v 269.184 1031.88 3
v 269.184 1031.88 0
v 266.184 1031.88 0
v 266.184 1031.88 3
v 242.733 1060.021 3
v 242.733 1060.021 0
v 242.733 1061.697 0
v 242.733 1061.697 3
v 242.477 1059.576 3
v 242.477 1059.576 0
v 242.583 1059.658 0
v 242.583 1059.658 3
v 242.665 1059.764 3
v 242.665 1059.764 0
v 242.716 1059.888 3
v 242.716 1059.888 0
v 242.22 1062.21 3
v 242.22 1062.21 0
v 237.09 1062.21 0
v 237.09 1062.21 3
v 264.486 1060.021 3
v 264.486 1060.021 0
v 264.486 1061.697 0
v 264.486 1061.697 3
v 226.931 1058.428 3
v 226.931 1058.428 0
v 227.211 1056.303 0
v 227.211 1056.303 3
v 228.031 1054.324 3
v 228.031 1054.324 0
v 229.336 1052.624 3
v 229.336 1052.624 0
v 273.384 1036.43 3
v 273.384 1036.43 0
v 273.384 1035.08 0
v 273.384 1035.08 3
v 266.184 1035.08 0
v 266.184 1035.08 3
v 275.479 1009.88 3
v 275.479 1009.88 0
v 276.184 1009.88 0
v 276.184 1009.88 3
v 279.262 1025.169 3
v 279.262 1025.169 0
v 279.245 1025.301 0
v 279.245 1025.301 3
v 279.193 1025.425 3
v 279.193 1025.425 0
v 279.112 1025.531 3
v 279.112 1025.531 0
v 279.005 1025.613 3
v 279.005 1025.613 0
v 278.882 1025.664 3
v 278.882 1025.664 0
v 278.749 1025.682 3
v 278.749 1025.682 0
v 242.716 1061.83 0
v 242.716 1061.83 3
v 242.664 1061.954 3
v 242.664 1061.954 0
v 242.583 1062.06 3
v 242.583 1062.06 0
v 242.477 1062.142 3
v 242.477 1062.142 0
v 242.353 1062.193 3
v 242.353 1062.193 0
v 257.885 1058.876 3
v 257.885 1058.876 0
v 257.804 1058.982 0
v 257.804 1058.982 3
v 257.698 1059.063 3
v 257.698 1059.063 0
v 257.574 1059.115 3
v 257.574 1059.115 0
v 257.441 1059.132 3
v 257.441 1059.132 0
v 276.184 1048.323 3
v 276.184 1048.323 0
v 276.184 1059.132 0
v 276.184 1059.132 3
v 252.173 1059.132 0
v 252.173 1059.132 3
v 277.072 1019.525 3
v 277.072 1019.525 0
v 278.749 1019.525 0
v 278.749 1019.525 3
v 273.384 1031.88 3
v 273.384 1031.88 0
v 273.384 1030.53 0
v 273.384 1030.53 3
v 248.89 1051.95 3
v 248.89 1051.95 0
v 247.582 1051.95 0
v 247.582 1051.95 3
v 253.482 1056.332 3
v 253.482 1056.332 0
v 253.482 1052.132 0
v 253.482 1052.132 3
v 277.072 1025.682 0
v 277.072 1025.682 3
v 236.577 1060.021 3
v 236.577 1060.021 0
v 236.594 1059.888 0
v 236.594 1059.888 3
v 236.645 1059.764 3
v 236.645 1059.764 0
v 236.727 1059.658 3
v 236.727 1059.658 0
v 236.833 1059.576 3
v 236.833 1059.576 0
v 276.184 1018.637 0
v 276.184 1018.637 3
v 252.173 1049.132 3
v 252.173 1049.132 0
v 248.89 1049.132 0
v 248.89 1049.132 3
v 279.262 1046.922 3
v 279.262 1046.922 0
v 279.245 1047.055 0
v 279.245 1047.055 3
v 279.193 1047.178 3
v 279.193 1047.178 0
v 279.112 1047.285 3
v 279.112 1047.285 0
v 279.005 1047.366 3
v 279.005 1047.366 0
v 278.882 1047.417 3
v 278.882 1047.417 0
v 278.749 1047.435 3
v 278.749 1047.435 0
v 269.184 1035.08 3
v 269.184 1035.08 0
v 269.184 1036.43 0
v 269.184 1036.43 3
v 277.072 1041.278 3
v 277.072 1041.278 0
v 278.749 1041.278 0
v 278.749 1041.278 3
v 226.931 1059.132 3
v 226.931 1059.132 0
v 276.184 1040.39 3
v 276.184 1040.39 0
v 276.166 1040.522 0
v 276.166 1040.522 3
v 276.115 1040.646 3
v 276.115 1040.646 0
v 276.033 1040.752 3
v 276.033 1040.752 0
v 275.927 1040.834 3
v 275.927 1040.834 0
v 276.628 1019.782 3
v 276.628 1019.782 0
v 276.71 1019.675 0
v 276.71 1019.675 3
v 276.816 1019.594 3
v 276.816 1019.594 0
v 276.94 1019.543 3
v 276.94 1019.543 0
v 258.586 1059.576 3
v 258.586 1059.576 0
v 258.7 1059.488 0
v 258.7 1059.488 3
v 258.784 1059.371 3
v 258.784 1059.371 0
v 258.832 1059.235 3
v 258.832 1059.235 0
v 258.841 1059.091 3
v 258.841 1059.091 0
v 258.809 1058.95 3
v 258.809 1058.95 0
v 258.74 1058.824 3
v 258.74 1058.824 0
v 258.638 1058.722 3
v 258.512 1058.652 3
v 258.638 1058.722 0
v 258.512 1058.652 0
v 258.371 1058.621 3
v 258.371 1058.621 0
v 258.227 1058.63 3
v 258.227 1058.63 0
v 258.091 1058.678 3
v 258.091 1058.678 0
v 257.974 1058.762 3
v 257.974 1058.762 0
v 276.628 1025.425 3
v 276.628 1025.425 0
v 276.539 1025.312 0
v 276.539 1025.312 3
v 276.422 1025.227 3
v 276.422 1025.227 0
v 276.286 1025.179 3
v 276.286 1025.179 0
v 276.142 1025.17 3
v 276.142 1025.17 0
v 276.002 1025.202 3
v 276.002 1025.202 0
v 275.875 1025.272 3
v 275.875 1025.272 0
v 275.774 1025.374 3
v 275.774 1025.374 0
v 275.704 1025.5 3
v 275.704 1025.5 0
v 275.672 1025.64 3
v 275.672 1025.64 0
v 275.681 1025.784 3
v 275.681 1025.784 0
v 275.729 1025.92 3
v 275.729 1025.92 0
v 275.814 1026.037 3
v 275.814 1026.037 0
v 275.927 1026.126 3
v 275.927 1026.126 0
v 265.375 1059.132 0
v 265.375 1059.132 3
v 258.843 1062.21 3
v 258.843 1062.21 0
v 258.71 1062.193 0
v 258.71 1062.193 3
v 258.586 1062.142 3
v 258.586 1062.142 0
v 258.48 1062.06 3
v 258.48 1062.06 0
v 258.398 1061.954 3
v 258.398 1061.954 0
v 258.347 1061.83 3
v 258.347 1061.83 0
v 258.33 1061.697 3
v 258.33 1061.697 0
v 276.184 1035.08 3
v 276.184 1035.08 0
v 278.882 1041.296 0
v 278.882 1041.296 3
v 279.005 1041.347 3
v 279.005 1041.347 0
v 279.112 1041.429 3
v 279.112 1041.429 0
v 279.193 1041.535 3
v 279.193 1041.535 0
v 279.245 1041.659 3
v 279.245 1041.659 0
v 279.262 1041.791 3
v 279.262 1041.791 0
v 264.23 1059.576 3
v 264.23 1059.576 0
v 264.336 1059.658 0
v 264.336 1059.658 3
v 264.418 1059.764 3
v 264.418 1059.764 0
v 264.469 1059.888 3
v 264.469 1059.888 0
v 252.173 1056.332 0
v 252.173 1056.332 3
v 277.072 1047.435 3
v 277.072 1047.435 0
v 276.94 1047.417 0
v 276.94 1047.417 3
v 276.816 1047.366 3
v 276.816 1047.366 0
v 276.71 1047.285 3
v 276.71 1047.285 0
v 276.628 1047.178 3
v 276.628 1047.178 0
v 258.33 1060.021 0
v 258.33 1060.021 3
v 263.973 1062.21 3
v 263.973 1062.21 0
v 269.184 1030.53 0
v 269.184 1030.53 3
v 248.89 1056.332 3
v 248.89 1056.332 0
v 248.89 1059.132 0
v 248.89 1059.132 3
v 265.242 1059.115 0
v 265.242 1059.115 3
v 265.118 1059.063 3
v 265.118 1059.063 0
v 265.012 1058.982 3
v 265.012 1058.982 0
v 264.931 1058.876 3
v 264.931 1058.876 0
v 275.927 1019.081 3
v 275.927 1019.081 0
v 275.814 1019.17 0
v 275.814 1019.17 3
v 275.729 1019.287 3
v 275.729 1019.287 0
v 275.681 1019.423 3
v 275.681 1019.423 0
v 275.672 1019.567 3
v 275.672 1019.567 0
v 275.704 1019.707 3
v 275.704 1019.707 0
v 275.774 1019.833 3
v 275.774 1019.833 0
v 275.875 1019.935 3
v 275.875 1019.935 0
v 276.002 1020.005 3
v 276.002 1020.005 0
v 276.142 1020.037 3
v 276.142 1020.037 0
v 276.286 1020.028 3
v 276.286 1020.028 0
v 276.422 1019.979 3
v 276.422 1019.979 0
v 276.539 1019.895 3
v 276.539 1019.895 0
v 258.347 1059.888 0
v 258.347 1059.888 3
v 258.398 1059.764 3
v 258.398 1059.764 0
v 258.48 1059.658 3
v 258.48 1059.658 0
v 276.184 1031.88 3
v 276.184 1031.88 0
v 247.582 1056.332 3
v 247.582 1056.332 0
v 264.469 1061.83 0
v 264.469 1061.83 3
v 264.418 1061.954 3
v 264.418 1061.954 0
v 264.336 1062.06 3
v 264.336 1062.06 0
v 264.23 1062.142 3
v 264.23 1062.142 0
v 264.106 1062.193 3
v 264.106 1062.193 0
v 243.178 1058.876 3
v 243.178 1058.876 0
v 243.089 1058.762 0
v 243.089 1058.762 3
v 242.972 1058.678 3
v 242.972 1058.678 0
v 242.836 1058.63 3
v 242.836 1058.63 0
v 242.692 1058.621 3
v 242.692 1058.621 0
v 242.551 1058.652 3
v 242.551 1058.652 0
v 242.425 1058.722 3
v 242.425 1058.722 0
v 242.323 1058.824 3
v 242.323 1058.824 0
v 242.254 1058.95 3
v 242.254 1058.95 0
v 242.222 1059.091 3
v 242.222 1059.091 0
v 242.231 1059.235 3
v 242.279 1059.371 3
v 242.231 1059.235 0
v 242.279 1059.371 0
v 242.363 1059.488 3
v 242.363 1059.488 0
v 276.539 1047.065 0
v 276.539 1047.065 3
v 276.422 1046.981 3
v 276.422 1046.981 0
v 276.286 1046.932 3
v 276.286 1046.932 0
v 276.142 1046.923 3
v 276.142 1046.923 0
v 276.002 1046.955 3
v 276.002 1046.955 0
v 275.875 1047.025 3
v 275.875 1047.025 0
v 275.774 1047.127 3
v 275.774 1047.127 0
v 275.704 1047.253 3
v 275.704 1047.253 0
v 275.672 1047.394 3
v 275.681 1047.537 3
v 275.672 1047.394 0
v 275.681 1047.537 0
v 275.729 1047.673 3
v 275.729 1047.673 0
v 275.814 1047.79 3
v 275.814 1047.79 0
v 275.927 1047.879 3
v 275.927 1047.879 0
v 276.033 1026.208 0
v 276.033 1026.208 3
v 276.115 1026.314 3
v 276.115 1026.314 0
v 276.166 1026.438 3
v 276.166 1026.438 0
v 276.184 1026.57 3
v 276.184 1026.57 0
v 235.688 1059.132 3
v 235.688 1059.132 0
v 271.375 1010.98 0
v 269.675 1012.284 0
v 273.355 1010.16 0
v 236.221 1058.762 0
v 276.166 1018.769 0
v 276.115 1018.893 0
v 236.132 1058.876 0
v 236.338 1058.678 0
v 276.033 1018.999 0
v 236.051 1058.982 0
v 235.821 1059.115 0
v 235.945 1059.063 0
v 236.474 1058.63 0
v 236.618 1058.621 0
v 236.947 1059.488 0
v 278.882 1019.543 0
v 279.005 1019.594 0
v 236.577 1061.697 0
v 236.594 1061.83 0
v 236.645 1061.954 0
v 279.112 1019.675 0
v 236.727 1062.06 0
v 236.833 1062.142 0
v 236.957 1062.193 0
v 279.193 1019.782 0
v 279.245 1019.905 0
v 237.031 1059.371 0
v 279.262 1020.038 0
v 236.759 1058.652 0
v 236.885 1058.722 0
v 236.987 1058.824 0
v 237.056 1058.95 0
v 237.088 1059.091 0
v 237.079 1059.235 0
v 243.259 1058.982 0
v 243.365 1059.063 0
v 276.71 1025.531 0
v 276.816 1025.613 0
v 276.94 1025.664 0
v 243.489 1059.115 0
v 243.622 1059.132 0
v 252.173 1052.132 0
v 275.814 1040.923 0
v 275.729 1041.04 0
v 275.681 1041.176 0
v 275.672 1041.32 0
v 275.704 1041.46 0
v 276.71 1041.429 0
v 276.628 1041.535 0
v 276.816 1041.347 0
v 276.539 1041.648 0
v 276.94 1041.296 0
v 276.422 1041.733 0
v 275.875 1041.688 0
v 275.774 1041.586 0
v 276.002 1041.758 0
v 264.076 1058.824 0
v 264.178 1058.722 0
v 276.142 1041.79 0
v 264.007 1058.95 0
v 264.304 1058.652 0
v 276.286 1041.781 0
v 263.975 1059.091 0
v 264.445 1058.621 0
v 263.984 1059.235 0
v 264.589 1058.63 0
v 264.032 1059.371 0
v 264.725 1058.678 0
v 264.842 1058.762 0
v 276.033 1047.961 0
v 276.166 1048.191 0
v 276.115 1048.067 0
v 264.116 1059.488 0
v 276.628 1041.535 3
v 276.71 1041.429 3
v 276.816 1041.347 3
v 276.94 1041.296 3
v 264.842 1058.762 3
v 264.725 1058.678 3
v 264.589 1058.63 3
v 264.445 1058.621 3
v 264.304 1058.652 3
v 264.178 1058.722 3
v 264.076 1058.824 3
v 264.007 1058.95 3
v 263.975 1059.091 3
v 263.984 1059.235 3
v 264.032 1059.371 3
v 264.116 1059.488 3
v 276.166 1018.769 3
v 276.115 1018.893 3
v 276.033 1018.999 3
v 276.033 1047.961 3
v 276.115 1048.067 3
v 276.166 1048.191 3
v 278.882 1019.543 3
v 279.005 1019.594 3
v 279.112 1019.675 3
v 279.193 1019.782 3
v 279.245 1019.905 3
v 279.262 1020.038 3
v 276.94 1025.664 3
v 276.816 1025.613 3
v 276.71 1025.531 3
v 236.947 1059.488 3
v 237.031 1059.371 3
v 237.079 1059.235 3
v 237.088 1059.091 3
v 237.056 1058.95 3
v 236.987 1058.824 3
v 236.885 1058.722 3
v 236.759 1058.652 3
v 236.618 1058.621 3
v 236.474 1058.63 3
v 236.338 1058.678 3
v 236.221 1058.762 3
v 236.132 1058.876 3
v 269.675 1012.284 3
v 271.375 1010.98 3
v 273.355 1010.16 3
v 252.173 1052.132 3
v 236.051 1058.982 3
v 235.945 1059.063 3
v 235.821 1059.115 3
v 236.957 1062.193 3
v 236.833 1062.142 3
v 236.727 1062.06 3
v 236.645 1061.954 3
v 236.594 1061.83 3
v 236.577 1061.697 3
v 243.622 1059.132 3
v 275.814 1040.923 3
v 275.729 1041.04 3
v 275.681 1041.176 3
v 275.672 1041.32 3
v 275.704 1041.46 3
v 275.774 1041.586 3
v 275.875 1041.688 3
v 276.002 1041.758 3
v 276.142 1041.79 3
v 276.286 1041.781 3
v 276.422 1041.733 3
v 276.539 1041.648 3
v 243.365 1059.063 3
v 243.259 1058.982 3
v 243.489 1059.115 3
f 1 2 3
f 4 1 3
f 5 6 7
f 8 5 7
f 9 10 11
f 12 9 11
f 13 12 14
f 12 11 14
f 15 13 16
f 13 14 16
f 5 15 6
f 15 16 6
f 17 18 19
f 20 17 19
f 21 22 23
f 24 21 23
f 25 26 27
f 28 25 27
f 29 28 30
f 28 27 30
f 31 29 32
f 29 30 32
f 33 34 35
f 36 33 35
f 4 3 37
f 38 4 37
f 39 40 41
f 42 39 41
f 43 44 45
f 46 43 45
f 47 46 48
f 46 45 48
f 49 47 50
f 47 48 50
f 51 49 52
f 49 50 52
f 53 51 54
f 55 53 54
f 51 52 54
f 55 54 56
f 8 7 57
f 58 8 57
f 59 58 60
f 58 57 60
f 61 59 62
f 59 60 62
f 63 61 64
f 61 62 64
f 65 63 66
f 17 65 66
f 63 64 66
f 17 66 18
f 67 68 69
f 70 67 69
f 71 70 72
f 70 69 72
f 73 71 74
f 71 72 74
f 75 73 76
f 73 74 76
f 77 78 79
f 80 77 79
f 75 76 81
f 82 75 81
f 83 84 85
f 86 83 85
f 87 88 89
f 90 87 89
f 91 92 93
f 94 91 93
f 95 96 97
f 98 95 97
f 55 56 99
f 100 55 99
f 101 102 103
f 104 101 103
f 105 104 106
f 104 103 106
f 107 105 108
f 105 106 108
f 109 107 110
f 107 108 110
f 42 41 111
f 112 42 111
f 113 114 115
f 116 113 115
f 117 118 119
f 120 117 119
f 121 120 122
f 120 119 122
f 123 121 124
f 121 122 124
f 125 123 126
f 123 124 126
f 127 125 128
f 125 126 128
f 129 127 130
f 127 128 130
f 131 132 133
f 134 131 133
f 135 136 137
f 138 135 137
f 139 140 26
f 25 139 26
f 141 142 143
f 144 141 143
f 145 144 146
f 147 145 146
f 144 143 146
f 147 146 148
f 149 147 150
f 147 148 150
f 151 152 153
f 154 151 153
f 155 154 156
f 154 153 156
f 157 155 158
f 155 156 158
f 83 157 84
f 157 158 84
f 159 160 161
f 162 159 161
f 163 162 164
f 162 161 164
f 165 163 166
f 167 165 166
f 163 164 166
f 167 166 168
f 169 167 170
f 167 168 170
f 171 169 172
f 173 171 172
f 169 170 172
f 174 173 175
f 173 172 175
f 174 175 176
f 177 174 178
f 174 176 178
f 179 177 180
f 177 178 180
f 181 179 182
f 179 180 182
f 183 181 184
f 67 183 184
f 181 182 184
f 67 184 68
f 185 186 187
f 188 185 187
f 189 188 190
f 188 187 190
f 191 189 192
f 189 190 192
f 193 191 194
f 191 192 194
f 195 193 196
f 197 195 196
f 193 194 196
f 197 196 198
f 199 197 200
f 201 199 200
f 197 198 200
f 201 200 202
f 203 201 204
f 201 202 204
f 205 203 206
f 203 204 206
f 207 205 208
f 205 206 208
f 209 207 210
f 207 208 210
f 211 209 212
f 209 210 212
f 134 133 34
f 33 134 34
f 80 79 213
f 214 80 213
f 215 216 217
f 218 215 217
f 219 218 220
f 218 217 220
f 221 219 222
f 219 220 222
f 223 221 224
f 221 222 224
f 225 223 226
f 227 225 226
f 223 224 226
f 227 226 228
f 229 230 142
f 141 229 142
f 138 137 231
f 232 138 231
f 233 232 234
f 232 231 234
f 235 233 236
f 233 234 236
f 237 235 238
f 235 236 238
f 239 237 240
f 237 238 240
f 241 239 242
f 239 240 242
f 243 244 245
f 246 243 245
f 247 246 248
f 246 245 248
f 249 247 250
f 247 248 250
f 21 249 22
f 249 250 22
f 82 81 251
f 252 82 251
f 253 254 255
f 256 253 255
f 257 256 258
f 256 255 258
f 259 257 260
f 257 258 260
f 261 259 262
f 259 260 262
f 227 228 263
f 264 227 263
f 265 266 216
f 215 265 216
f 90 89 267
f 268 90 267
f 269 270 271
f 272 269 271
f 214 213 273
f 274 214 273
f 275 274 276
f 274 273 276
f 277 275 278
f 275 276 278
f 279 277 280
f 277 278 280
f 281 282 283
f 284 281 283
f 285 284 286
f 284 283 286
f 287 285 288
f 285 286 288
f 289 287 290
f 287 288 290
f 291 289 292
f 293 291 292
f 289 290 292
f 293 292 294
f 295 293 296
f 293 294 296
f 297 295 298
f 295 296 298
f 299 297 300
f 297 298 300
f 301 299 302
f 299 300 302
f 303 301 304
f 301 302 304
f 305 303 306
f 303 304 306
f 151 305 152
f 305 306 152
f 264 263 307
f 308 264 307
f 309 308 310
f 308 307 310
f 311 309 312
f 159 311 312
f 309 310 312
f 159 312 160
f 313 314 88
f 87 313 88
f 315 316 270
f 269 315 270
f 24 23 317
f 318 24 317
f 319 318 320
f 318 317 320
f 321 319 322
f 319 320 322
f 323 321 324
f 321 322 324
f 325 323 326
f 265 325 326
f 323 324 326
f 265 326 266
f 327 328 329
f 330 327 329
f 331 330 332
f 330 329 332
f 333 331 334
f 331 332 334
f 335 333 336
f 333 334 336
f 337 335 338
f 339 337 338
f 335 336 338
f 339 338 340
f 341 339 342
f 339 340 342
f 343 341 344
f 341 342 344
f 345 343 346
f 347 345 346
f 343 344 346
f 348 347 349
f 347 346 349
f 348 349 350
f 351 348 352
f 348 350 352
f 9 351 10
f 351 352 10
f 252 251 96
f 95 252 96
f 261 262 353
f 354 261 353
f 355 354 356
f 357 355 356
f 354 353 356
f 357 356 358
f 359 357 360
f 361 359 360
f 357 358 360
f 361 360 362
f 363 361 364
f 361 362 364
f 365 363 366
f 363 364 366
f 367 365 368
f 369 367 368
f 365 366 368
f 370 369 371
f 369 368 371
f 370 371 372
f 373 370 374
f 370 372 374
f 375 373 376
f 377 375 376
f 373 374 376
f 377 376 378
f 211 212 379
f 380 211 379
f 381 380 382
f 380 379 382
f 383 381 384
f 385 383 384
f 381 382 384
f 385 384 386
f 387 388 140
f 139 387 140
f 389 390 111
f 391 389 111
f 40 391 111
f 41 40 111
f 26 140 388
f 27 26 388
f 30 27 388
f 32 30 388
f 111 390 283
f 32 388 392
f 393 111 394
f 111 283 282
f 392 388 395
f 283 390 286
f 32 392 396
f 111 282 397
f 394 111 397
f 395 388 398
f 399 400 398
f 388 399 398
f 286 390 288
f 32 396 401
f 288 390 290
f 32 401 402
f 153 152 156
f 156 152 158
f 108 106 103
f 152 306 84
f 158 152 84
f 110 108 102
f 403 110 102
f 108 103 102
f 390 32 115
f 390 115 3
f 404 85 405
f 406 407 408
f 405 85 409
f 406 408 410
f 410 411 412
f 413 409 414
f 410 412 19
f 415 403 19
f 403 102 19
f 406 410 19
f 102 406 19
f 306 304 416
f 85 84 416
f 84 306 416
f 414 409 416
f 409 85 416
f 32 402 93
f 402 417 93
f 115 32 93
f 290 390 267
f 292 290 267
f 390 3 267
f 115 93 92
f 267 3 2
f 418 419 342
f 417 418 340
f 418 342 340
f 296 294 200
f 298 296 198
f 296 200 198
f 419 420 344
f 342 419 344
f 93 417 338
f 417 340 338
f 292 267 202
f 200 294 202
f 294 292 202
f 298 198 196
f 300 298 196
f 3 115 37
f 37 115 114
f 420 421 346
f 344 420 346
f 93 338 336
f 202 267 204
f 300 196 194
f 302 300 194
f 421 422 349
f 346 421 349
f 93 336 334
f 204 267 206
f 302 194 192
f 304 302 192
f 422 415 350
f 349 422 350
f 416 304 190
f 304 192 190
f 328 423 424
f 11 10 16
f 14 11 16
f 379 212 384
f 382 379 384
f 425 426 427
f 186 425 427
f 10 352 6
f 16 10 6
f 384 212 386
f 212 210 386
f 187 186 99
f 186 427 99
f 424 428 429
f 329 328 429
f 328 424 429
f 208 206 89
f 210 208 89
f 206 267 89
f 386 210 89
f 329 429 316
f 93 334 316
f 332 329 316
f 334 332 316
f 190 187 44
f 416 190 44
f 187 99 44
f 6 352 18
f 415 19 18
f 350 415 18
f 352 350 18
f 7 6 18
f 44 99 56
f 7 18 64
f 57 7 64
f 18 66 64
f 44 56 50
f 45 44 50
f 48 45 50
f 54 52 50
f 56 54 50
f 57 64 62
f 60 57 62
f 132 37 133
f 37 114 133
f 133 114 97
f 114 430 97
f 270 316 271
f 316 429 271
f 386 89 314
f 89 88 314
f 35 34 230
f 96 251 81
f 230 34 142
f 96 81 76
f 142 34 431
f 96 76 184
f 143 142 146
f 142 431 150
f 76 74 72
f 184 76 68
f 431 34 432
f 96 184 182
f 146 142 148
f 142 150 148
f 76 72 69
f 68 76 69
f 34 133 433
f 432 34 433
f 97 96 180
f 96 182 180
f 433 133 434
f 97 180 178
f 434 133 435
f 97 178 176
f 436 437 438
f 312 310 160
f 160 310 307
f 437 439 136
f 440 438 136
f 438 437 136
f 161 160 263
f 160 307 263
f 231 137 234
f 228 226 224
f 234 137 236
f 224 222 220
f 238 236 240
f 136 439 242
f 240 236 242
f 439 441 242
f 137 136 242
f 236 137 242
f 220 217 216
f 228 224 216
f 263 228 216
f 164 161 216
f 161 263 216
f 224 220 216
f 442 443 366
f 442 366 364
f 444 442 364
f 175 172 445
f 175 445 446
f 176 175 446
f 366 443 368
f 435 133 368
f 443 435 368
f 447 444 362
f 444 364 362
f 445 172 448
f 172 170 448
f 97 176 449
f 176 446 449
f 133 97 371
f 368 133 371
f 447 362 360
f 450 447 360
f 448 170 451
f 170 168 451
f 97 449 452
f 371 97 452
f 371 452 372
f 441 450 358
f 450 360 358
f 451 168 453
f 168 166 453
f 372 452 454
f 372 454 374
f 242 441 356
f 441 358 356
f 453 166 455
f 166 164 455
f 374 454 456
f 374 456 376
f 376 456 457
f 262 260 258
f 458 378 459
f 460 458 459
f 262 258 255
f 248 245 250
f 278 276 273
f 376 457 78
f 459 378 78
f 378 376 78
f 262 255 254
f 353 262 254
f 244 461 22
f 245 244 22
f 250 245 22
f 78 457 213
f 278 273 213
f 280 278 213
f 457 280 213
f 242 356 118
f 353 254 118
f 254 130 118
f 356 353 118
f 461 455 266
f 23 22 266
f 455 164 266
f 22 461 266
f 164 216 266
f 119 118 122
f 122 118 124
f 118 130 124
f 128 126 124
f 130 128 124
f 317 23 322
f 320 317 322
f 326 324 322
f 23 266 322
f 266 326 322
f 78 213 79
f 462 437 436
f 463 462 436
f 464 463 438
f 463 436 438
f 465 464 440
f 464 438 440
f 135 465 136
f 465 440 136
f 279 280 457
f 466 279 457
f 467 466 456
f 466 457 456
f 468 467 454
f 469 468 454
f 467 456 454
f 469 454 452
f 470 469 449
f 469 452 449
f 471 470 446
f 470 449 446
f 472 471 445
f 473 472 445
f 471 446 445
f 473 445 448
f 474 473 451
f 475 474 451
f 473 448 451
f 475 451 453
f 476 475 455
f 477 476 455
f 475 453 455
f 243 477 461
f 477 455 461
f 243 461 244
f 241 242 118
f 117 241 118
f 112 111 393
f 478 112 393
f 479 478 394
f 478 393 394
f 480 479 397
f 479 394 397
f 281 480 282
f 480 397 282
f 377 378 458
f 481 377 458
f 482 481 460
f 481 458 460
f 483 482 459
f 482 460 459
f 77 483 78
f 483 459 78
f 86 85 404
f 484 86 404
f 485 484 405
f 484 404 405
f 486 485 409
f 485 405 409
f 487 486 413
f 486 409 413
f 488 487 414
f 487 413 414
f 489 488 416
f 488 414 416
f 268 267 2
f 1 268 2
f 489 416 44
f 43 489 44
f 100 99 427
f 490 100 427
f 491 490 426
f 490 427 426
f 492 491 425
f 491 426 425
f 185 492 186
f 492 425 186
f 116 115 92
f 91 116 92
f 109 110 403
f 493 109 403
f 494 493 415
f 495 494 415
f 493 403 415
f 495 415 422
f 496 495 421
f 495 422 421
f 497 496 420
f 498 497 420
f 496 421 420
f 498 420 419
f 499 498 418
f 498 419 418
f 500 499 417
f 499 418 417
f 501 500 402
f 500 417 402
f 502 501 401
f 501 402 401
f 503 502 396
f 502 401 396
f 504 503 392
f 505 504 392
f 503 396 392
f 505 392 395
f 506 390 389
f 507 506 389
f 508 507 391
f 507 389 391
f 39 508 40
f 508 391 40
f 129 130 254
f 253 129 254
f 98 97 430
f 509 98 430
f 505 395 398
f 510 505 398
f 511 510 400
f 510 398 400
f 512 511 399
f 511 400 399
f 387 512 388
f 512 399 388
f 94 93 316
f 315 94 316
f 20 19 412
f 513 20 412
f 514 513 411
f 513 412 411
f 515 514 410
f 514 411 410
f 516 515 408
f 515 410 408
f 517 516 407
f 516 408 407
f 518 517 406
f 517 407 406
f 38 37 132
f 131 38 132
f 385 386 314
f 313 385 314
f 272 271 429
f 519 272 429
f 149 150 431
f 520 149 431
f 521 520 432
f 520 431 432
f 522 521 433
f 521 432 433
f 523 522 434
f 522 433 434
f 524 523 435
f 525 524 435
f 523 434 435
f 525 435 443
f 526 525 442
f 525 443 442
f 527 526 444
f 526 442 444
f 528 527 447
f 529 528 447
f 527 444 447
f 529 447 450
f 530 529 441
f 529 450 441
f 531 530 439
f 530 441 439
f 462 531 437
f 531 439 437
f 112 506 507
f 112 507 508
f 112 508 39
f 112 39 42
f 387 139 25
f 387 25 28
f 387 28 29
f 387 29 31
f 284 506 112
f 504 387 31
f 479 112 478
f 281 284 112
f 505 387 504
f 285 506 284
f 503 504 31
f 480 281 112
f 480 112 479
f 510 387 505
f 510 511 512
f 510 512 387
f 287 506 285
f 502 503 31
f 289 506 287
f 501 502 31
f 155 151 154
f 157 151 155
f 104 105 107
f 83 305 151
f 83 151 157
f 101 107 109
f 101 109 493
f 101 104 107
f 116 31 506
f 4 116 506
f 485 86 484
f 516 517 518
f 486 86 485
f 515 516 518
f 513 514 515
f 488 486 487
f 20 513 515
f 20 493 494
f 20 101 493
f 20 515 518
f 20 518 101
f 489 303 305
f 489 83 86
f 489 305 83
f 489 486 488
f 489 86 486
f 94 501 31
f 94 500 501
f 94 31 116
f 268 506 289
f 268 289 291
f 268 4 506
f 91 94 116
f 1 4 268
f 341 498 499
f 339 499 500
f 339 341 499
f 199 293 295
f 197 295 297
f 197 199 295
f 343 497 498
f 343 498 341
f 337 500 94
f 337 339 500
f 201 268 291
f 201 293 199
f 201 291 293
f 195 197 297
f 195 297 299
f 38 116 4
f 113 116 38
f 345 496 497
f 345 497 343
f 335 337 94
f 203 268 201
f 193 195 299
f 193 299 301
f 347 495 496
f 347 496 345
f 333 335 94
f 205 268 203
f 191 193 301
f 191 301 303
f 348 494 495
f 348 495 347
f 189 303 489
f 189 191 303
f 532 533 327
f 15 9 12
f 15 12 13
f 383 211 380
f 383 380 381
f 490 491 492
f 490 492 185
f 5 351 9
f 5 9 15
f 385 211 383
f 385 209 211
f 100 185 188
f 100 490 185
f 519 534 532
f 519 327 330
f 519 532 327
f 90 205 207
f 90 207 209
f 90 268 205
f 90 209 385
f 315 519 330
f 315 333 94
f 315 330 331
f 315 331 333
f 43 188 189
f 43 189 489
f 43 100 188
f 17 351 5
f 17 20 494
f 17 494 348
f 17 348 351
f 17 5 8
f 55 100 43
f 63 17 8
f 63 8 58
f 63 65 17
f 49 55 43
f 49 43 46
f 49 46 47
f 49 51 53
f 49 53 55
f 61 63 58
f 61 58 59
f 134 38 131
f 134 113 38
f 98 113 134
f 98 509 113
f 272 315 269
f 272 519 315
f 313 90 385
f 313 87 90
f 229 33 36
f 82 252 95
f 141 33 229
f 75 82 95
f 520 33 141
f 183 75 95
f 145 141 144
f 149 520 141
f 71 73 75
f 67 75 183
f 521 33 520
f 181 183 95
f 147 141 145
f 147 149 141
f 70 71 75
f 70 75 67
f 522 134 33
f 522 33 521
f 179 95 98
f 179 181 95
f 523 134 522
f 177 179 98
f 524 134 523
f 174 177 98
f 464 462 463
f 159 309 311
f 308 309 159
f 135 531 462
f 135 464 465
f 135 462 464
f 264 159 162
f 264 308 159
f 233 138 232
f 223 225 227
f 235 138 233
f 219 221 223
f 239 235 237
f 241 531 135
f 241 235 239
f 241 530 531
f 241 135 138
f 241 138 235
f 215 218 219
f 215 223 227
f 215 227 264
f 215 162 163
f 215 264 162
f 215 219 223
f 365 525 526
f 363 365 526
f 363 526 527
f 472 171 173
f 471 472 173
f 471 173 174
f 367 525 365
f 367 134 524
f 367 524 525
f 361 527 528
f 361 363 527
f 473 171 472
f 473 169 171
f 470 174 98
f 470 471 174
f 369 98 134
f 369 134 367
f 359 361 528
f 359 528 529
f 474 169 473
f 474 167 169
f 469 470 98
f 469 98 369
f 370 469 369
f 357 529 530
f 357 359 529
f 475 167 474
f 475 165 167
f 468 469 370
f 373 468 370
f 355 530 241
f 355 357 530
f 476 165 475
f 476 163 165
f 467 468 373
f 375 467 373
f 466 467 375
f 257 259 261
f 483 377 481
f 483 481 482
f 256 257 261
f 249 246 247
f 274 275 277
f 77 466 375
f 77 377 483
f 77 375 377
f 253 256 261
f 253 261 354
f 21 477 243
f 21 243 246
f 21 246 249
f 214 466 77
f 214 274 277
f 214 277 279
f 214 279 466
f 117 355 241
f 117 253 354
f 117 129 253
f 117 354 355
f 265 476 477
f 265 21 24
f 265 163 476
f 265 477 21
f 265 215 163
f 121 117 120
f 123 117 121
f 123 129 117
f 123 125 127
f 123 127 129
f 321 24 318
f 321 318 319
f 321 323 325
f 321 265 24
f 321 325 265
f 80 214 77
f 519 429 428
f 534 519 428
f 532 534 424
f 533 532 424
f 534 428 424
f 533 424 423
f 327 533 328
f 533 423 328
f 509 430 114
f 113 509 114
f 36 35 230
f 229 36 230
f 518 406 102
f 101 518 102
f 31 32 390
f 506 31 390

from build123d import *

# Parameters (mm, degrees)
BOSS_EXTRUDE1_DEPTH = 3


with BuildPart() as part:
    # Sketch1 → Boss-Extrude1 (new body)
    with BuildSketch(Plane.XY):
        with BuildLine():
            Line((278.748942769, 1025.68174137), (277.072289062, 1025.68174137))
            ThreePointArc((277.072289062, 1025.68174137), (276.81576773, 1025.613006812), (276.627980847, 1025.425220446))
            ThreePointArc((276.627980847, 1025.425220446), (275.820896535, 1025.31896689), (275.927149562, 1026.126051271))
            ThreePointArc((275.927149562, 1026.126051271), (276.114935991, 1026.313838161), (276.183670574, 1026.570359537))
            Line((276.183670574, 1026.570359537), (276.183670574, 1031.88000541))
            Line((276.183670574, 1031.88000541), (273.383670574, 1031.88000541))
            Line((273.383670574, 1031.88000541), (273.383670574, 1030.53000541))
            Line((273.383670574, 1030.53000541), (269.183670574, 1030.53000541))
            Line((269.183670574, 1030.53000541), (269.183670574, 1031.88000541))
            Line((269.183670574, 1031.88000541), (266.183670574, 1031.88000541))
            Line((266.183670574, 1031.88000541), (266.183670574, 1035.08000541))
            Line((266.183670574, 1035.08000541), (269.183670574, 1035.08000541))
            Line((269.183670574, 1035.08000541), (269.183670574, 1036.43000541))
            Line((269.183670574, 1036.43000541), (273.383670574, 1036.43000541))
            Line((273.383670574, 1036.43000541), (273.383670574, 1035.08000541))
            Line((273.383670574, 1035.08000541), (276.183670574, 1035.08000541))
            Line((276.183670574, 1035.08000541), (276.183670574, 1040.389649836))
            ThreePointArc((276.183670574, 1040.389649836), (276.114935781, 1040.646171575), (275.927148835, 1040.833958522))
            ThreePointArc((275.927148835, 1040.833958522), (275.820893173, 1041.641043417), (276.627978373, 1041.534790067))
            ThreePointArc((276.627978373, 1041.534790067), (276.815765346, 1041.347004134), (277.072286505, 1041.278269871))
            Line((277.072286505, 1041.278269871), (278.748941322, 1041.278269871))
            ThreePointArc((278.748941322, 1041.278269871), (279.111717845, 1041.428536827), (279.2619848, 1041.791313349))
            Line((279.2619848, 1041.791313349), (279.2619848, 1046.92174608))
            ThreePointArc((279.2619848, 1046.92174608), (279.111717845, 1047.284522602), (278.748941322, 1047.434789558))
            Line((278.748941322, 1047.434789558), (277.072287615, 1047.434789558))
            ThreePointArc((277.072287615, 1047.434789558), (276.815766284, 1047.366055), (276.6279794, 1047.178268634))
            ThreePointArc((276.6279794, 1047.178268634), (275.820895088, 1047.072015078), (275.927148115, 1047.879099459))
            ThreePointArc((275.927148115, 1047.879099459), (276.114934137, 1048.066885643), (276.183669127, 1048.323406094))
            Line((276.183669127, 1048.323406094), (276.183669127, 1059.132180233))
            Line((276.183669127, 1059.132180233), (265.374902832, 1059.132180233))
            ThreePointArc((265.374902832, 1059.132180233), (265.118381093, 1059.06344544), (264.930594147, 1058.875658494))
            ThreePointArc((264.930594147, 1058.875658494), (264.12351003, 1058.769403455), (264.229761575, 1059.576488032))
            ThreePointArc((264.229761575, 1059.576488032), (264.417547508, 1059.764275005), (264.486281771, 1060.020796163))
            Line((264.486281771, 1060.020796163), (264.486281771, 1061.697450981))
            ThreePointArc((264.486281771, 1061.697450981), (264.336014816, 1062.060227503), (263.973238293, 1062.210494459))
            Line((263.973238293, 1062.210494459), (258.842805647, 1062.210494459))
            ThreePointArc((258.842805647, 1062.210494459), (258.480029457, 1062.060227836), (258.329762168, 1061.697451923))
            Line((258.329762168, 1061.697451923), (258.329762168, 1060.020799457))
            ThreePointArc((258.329762168, 1060.020799457), (258.398497036, 1059.764277588), (258.586284167, 1059.576490622))
            ThreePointArc((258.586284167, 1059.576490622), (258.692539677, 1058.769406567), (257.885455039, 1058.875657641))
            ThreePointArc((257.885455039, 1058.875657641), (257.697667956, 1059.063443464), (257.441146757, 1059.132177578))
            Line((257.441146757, 1059.132177578), (252.173247105, 1059.132177578))
            Line((252.173247105, 1059.132177578), (252.173247105, 1056.332177578))
            Line((252.173247105, 1056.332177578), (253.481501818, 1056.332177578))
            Line((253.481501818, 1056.332177578), (253.481501818, 1052.132177578))
            Line((253.481501818, 1052.132177578), (252.173247105, 1052.132177578))
            Line((252.173247105, 1052.132177578), (252.173247105, 1049.132177578))
            Line((252.173247105, 1049.132177578), (248.889756531, 1049.132177578))
            Line((248.889756531, 1049.132177578), (248.889756531, 1051.949568882))
            Line((248.889756531, 1051.949568882), (247.581501818, 1051.949568882))
            Line((247.581501818, 1051.949568882), (247.581501818, 1056.332177578))
            Line((247.581501818, 1056.332177578), (248.889756531, 1056.332177578))
            Line((248.889756531, 1056.332177578), (248.889756531, 1059.132177578))
            Line((248.889756531, 1059.132177578), (243.621854827, 1059.132177578))
            ThreePointArc((243.621854827, 1059.132177578), (243.365333088, 1059.063442785), (243.177546141, 1058.875655838))
            ThreePointArc((243.177546141, 1058.875655838), (242.370461246, 1058.769400177), (242.476714596, 1059.576485377))
            ThreePointArc((242.476714596, 1059.576485377), (242.664500529, 1059.764272349), (242.733234792, 1060.020793508))
            Line((242.733234792, 1060.020793508), (242.733234792, 1061.697448325))
            ThreePointArc((242.733234792, 1061.697448325), (242.582967836, 1062.060224848), (242.220191314, 1062.210491804))
            Line((242.220191314, 1062.210491804), (237.089758668, 1062.210491804))
            ThreePointArc((237.089758668, 1062.210491804), (236.726982478, 1062.060225181), (236.576715189, 1061.697449267))
            Line((236.576715189, 1061.697449267), (236.576715189, 1060.020796683))
            ThreePointArc((236.576715189, 1060.020796683), (236.645450027, 1059.764274865), (236.833237085, 1059.576487907))
            ThreePointArc((236.833237085, 1059.576487907), (236.939492407, 1058.769403827), (236.132407793, 1058.875655089))
            ThreePointArc((236.132407793, 1058.875655089), (235.944620754, 1059.063440956), (235.688099571, 1059.132175129))
            Line((235.688099571, 1059.132175129), (226.93149811, 1059.132175129))
            Line((226.93149811, 1059.132175129), (226.93149811, 1058.427981397))
            ThreePointArc((226.93149811, 1058.427981397), (227.55634793, 1055.286649403), (229.335769658, 1052.623556781))
            Line((229.335769658, 1052.623556781), (269.675051729, 1012.284272653))
            ThreePointArc((269.675051729, 1012.284272653), (272.338145025, 1010.504850709), (275.479477777, 1009.880001213))
            Line((275.479477777, 1009.880001213), (276.183670574, 1009.880001213))
            Line((276.183670574, 1009.880001213), (276.183670574, 1018.636602674))
            ThreePointArc((276.183670574, 1018.636602674), (276.114935781, 1018.893124413), (275.927148835, 1019.08091136))
            ThreePointArc((275.927148835, 1019.08091136), (275.820893173, 1019.887996255), (276.627978373, 1019.781742905))
            ThreePointArc((276.627978373, 1019.781742905), (276.815765346, 1019.593956972), (277.072286504, 1019.525222709))
            Line((277.072286504, 1019.525222709), (278.748941322, 1019.525222709))
            ThreePointArc((278.748941322, 1019.525222709), (279.111717844, 1019.675489665), (279.2619848, 1020.038266187))
            Line((279.2619848, 1020.038266187), (279.2619848, 1025.168697892))
            ThreePointArc((279.2619848, 1025.168697892), (279.111718356, 1025.531473903), (278.748942769, 1025.68174137))
        make_face()
    extrude(amount=BOSS_EXTRUDE1_DEPTH)


solid = part.part
